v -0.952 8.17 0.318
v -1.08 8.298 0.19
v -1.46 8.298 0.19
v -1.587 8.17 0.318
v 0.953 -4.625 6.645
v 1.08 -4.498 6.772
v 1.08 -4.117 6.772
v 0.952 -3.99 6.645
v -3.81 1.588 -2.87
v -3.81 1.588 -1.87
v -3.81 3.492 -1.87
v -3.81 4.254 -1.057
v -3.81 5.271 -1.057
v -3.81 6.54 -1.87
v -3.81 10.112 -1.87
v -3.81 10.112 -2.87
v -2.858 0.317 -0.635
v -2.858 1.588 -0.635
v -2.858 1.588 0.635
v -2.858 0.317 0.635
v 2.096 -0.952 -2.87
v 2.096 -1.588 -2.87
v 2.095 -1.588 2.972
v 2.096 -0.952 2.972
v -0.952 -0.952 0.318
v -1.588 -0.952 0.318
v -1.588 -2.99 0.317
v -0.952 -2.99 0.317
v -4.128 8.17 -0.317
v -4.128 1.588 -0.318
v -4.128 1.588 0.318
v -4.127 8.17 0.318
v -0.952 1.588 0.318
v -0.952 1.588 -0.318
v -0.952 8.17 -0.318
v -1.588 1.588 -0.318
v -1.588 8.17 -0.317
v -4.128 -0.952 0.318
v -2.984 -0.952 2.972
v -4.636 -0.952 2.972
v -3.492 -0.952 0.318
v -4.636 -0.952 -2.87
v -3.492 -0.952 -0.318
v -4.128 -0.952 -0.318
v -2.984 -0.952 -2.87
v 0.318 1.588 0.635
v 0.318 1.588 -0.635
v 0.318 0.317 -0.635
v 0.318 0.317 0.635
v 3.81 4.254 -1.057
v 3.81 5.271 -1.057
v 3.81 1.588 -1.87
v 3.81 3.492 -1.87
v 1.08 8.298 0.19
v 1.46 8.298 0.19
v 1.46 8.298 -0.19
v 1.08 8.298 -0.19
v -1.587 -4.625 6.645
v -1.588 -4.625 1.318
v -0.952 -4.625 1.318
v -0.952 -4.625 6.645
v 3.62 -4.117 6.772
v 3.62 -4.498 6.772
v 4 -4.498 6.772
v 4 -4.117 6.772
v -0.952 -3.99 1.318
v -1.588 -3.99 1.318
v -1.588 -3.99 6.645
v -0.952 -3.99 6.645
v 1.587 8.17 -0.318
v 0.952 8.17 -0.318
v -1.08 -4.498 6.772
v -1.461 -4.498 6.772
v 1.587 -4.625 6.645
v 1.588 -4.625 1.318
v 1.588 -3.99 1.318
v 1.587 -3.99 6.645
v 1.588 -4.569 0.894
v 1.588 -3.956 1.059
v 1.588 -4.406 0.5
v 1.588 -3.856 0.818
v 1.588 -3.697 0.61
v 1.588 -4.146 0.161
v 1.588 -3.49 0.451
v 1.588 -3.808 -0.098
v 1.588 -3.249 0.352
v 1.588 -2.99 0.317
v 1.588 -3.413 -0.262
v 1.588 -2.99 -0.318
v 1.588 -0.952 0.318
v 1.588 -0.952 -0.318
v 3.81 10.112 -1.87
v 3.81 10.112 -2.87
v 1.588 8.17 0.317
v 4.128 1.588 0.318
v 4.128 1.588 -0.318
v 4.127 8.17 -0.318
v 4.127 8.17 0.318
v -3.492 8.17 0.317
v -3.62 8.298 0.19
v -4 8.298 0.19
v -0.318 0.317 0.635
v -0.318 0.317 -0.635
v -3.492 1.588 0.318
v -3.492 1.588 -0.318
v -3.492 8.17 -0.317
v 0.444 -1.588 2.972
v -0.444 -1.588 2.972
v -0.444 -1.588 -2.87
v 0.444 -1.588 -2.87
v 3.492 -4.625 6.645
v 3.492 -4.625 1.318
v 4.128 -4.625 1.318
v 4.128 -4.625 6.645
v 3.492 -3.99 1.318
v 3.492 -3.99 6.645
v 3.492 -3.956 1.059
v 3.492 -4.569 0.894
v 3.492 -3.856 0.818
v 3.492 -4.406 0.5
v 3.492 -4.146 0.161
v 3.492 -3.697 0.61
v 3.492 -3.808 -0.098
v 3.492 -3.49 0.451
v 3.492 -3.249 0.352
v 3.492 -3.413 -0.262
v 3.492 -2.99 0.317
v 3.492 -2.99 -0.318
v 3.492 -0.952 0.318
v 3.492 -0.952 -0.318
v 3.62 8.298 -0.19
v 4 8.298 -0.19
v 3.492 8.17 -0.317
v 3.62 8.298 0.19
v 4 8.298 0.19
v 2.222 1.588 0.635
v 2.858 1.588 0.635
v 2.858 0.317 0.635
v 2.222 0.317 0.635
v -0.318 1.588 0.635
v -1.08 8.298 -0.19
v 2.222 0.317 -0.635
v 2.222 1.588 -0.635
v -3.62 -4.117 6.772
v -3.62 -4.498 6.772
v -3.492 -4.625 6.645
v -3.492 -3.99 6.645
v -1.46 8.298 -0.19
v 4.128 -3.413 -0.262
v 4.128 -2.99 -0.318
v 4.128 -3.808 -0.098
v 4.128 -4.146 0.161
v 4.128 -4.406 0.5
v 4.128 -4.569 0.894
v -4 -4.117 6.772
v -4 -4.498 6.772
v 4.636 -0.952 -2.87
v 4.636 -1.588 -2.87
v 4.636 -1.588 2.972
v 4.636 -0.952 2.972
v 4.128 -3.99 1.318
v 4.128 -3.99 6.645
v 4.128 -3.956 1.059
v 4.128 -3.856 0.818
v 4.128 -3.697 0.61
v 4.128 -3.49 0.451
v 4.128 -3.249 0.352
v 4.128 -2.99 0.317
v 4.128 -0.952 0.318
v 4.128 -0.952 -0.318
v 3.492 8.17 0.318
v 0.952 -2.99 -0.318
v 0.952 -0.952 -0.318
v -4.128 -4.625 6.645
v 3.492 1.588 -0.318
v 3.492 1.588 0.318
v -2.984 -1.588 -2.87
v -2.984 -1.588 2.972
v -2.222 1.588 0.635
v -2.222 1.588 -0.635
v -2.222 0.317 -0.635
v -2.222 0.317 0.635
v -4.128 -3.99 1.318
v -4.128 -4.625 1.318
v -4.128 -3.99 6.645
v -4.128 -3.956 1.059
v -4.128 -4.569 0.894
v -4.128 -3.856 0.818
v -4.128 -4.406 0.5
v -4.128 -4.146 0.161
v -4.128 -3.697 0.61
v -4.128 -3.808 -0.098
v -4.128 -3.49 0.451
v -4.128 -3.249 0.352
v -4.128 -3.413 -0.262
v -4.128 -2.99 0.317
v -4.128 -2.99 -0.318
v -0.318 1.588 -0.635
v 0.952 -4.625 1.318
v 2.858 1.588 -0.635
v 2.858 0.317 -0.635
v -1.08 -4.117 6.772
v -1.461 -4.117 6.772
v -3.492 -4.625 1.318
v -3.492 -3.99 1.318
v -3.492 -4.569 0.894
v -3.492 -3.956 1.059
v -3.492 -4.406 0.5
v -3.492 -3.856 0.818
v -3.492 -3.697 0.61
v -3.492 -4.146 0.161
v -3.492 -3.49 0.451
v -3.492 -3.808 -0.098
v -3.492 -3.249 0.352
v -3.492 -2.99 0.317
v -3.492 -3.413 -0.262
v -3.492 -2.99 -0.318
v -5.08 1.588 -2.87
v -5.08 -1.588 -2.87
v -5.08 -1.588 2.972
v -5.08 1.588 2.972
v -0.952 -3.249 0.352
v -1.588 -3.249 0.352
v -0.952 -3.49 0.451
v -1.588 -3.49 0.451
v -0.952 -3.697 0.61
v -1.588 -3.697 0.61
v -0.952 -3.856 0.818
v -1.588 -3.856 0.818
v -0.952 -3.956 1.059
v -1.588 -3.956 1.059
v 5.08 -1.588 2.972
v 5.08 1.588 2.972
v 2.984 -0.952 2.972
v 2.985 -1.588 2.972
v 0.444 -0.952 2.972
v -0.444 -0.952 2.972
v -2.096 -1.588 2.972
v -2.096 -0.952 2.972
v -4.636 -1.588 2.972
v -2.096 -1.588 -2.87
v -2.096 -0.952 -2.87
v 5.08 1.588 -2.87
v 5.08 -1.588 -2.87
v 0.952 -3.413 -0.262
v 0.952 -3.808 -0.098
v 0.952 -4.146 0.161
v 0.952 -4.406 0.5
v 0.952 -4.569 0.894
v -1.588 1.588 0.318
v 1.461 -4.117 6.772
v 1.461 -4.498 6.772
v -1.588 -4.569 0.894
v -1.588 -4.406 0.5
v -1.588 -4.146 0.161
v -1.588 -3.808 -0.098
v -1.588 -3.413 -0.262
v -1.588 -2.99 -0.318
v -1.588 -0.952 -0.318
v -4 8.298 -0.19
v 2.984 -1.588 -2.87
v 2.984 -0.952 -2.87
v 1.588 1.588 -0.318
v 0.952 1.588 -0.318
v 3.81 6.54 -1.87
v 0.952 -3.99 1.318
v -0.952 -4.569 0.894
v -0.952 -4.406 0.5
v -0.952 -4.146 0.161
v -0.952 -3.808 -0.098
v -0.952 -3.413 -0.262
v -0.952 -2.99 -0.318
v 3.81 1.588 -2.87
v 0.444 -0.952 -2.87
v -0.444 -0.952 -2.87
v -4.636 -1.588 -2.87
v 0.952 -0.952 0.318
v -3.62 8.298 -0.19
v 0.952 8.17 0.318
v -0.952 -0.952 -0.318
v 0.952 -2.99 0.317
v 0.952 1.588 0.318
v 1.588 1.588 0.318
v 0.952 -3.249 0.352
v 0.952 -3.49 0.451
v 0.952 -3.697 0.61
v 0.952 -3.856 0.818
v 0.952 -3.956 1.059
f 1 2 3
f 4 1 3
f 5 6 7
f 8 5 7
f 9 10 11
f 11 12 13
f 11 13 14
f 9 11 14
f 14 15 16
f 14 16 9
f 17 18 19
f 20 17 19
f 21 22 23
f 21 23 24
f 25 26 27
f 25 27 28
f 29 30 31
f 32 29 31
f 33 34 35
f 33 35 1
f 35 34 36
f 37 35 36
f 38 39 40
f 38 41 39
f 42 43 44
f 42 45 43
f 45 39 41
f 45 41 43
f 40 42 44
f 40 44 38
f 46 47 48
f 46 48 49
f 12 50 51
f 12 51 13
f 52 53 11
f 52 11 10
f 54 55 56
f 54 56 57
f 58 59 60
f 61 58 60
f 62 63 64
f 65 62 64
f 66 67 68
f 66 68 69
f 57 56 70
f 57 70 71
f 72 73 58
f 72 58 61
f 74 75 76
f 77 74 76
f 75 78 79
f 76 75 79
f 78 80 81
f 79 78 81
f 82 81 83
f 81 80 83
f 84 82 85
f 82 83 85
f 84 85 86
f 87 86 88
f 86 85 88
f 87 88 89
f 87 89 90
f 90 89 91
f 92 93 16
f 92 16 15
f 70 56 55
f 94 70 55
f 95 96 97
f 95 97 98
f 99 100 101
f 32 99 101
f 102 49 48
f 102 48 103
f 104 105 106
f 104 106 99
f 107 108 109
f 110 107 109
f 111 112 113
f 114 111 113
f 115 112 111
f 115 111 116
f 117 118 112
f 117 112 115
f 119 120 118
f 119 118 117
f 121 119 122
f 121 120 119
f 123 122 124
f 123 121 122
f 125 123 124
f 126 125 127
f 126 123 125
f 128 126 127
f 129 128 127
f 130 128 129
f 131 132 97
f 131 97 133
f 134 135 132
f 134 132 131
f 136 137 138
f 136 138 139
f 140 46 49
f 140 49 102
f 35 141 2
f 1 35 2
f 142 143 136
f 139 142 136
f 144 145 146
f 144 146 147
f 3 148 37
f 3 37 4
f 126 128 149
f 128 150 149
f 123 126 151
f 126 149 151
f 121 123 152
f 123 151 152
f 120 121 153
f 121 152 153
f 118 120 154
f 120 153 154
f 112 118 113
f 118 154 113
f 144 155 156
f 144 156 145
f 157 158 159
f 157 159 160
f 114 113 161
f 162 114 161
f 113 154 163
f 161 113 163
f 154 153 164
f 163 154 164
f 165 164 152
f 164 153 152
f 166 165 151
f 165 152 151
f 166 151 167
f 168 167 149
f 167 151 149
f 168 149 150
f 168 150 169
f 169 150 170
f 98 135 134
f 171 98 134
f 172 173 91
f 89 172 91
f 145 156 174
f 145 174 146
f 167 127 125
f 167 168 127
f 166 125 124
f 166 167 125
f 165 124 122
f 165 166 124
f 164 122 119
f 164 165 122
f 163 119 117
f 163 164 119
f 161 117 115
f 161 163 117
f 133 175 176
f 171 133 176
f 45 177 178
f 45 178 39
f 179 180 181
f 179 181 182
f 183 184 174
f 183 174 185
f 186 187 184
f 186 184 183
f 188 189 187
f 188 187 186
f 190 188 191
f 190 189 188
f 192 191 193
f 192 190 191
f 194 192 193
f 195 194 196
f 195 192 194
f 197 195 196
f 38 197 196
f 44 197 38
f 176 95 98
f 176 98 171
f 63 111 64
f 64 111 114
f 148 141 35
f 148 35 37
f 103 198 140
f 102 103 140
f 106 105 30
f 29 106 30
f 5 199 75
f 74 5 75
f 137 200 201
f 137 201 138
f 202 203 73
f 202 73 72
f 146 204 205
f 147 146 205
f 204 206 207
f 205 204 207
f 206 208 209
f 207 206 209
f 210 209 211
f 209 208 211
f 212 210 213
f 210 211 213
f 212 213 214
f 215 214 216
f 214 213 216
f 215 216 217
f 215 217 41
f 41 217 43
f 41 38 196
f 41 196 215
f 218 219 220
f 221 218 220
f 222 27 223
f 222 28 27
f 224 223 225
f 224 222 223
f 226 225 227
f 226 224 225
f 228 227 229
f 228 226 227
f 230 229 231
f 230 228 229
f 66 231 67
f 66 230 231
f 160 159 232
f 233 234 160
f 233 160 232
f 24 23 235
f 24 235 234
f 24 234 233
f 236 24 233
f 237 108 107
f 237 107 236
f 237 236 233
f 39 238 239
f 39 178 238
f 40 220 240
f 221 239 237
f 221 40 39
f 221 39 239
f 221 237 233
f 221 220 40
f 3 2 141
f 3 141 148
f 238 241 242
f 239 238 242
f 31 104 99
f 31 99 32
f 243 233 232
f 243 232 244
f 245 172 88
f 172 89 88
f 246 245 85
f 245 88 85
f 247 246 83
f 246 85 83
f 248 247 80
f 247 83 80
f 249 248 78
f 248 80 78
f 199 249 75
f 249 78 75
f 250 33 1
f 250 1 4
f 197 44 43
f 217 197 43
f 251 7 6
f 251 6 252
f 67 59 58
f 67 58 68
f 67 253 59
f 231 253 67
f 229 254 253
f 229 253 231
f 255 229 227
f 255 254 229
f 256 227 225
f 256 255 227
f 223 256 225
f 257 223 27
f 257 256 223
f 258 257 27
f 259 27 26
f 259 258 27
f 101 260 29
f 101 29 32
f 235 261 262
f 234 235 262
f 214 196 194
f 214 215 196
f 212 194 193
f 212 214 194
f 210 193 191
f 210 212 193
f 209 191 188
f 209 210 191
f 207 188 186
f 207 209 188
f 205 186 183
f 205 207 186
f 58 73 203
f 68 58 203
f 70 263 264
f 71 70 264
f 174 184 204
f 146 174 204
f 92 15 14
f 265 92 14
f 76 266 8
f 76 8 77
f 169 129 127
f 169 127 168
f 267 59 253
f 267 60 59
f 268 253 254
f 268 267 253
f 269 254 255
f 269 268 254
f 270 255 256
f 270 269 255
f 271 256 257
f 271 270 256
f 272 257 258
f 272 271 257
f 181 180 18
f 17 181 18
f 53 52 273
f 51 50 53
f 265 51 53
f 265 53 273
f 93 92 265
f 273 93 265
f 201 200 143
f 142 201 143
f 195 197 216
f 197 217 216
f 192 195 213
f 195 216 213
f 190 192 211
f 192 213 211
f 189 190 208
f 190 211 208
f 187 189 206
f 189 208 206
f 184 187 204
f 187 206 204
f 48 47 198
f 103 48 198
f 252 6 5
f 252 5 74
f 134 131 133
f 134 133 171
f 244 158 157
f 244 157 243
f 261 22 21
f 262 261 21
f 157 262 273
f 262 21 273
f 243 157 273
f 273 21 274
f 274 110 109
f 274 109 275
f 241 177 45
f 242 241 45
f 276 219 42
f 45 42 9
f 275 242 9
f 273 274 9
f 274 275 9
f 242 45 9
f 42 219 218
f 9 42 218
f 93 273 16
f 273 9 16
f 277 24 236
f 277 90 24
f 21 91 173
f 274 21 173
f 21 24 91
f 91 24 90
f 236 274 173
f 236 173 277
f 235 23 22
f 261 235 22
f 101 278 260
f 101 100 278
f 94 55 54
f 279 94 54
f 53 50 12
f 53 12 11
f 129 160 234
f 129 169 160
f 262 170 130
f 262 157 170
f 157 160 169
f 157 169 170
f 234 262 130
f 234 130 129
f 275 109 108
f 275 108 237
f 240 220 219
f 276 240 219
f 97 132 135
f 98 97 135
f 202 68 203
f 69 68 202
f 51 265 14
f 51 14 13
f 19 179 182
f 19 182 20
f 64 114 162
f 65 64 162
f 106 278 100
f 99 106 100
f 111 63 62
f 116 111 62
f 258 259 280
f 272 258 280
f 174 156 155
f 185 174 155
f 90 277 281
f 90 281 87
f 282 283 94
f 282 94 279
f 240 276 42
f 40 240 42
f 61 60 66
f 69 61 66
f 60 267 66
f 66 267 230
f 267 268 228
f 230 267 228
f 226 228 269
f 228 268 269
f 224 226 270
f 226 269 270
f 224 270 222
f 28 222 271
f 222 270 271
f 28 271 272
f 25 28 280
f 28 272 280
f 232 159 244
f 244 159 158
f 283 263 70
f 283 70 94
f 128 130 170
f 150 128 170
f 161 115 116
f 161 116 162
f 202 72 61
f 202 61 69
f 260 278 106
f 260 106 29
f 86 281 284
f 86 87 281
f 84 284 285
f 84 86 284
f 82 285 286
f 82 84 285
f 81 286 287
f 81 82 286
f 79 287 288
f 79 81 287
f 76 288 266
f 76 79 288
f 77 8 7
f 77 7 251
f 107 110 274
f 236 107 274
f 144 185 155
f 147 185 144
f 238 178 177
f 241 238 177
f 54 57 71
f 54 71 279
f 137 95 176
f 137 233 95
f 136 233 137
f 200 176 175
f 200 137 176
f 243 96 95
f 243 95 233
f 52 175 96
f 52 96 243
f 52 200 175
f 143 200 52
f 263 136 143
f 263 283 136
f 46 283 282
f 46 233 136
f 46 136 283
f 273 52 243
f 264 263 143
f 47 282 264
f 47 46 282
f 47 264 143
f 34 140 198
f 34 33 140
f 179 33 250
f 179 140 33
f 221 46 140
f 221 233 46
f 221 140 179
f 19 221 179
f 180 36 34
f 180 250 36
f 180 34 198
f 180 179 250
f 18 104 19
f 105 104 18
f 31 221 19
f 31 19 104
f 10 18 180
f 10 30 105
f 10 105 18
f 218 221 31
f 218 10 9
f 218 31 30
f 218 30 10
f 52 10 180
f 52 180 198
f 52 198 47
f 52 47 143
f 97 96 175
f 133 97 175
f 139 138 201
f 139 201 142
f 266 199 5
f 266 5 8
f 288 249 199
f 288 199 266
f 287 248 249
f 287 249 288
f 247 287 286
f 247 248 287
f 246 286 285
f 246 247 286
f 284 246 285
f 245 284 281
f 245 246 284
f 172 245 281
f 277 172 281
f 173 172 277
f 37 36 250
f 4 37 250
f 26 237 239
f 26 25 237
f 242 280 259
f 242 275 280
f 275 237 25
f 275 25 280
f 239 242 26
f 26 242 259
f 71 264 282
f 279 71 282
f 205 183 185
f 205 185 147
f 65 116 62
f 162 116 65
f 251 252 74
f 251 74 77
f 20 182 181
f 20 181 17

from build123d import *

# Parameters (mm, degrees)
SKETCH1_W            = 8.89
SKETCH1_H            = 5.842
BOSS_EXTRUDE1_DEPTH  = 3.175
BOSS_EXTRUDE2_DEPTH  = 7.62
SKETCH3_W            = 5.842
SKETCH3_H            = 3.175
BOSS_EXTRUDE3_DEPTH  = 1.27
SKETCH4_W            = 1.651
SKETCH4_H            = 0.635
CUT_EXTRUDE1_DEPTH   = 13.735698656
SKETCH5_W            = 0.635
SKETCH5_H            = 0.635
BOSS_EXTRUDE4_DEPTH  = 3.6725
SKETCH6_W            = 0.635
SKETCH6_H            = 0.635
BOSS_EXTRUDE5_DEPTH  = 6.4543
SKETCH7_W            = 1.651
SKETCH7_H            = 0.635
CUT_EXTRUDE2_DEPTH   = 15.867320547
SKETCH8_W            = 0.635
SKETCH8_H            = 0.635
BOSS_EXTRUDE6_DEPTH  = 3.6725
SKETCH9_W            = 0.635
SKETCH9_H            = 0.635
BOSS_EXTRUDE7_DEPTH  = 6.4543
SKETCH10_W           = 1.651
SKETCH10_H           = 0.635
CUT_EXTRUDE3_DEPTH   = 15.867320547
SKETCH11_W           = 0.635
SKETCH11_H           = 0.635
BOSS_EXTRUDE8_DEPTH  = 3.6725
SKETCH12_W           = 0.635
SKETCH12_H           = 0.635
BOSS_EXTRUDE9_DEPTH  = 6.4543
SKETCH13_W           = 1.651
SKETCH13_H           = 0.635
CUT_EXTRUDE4_DEPTH   = 15.867320547
SKETCH14_W           = 0.635
SKETCH14_H           = 0.635
BOSS_EXTRUDE10_DEPTH = 3.6725
SKETCH15_W           = 0.635
SKETCH15_H           = 0.635
BOSS_EXTRUDE11_DEPTH = 6.4543
SKETCH16_W           = 0.635
SKETCH16_H           = 0.635
BOSS_EXTRUDE12_DEPTH = 6.71
SKETCH17_W           = 0.635
SKETCH17_H           = 0.635
BOSS_EXTRUDE13_DEPTH = 6.71
SKETCH18_W           = 0.635
SKETCH18_H           = 0.635
BOSS_EXTRUDE14_DEPTH = 6.71
SKETCH19_W           = 0.635
SKETCH19_H           = 0.635
BOSS_EXTRUDE15_DEPTH = 6.71
SKETCH20_W           = 0.635
SKETCH20_H           = 1.27
CUT_EXTRUDE5_DEPTH   = 1.27
SKETCH21_W           = 0.635
SKETCH21_H           = 1.27
CUT_EXTRUDE6_DEPTH   = 1.27
SKETCH22_W           = 0.635
SKETCH22_H           = 1.27
CUT_EXTRUDE7_DEPTH   = 1.27
CHAMFER1_SIZE        = 0.127
CHAMFER2_SIZE        = 0.753913762
CHAMFER2_SIZE2       = 0.55706549
FILLET1_R            = 1
FILLET2_R            = 1.635


with BuildPart() as part:
    # Sketch1 → Boss-Extrude1 (new body)
    with BuildSketch(Plane.XZ.offset(1.5875)):
        with Locations((-0.635, 0.0508)):
            Rectangle(SKETCH1_W, SKETCH1_H)
    extrude(amount=-BOSS_EXTRUDE1_DEPTH)

    # Sketch2 → Boss-Extrude2 (add)
    with BuildSketch(Plane(origin=(3.81, 0, 0), x_dir=(0, 0, -1), z_dir=(1, 0, 0))):
        Polygon((0.651, 4.6355), (1.8702, 3.4925), (1.8702, 1.5875), (2.8702, 1.5875), (2.8702, 10.1125), (1.8702, 10.1125), (1.8702, 6.5405), align=None)
    extrude(amount=-BOSS_EXTRUDE2_DEPTH)

    # Sketch3 → Boss-Extrude3 (add)
    with BuildSketch(Plane(origin=(3.81, 0, 0), x_dir=(0, 0, -1), z_dir=(1, 0, 0))):
        with Locations((-0.0508, 0)):
            Rectangle(SKETCH3_W, SKETCH3_H)
    extrude(amount=BOSS_EXTRUDE3_DEPTH)

    # Sketch4 → Cut-Extrude1 (cut, through all)
    with BuildSketch(Plane(origin=(0, 0, -2.8702), x_dir=(-1, 0, 0), z_dir=(0, 0, -1))):
        with Locations((1.27, -1.27)):
            Rectangle(SKETCH4_W, SKETCH4_H)
    extrude(amount=-CUT_EXTRUDE1_DEPTH, mode=Mode.SUBTRACT)

    # Sketch5 → Boss-Extrude4 (add)
    with BuildSketch(Plane.XZ.offset(0.9525)):
        with Locations((-1.27, 0)):
            Rectangle(SKETCH5_W, SKETCH5_H)
    extrude(amount=BOSS_EXTRUDE4_DEPTH)

    # Sketch6 → Boss-Extrude5 (add)
    with BuildSketch(Plane.XY.offset(0.3175)):
        with Locations((-1.27, -4.3075)):
            Rectangle(SKETCH6_W, SKETCH6_H)
    extrude(amount=BOSS_EXTRUDE5_DEPTH)

    # Sketch7 → Cut-Extrude2 (cut, through all)
    with BuildSketch(Plane(origin=(0, 0, -2.8702), x_dir=(-1, 0, 0), z_dir=(0, 0, -1))):
        with Locations((-1.27, -1.27)):
            Rectangle(SKETCH7_W, SKETCH7_H)
    extrude(amount=-CUT_EXTRUDE2_DEPTH, mode=Mode.SUBTRACT)

    # Sketch8 → Boss-Extrude6 (add)
    with BuildSketch(Plane.XZ.offset(0.9525)):
        with Locations((1.27, 0)):
            Rectangle(SKETCH8_W, SKETCH8_H)
    extrude(amount=BOSS_EXTRUDE6_DEPTH)

    # Sketch9 → Boss-Extrude7 (add)
    with BuildSketch(Plane.XY.offset(0.3175)):
        with Locations((1.27, -4.3075)):
            Rectangle(SKETCH9_W, SKETCH9_H)
    extrude(amount=BOSS_EXTRUDE7_DEPTH)

    # Sketch10 → Cut-Extrude3 (cut, through all)
    with BuildSketch(Plane(origin=(0, 0, -2.8702), x_dir=(-1, 0, 0), z_dir=(0, 0, -1))):
        with Locations((3.81, -1.27)):
            Rectangle(SKETCH10_W, SKETCH10_H)
    extrude(amount=-CUT_EXTRUDE3_DEPTH, mode=Mode.SUBTRACT)

    # Sketch11 → Boss-Extrude8 (add)
    with BuildSketch(Plane.XZ.offset(0.9525)):
        with Locations((-3.81, 0)):
            Rectangle(SKETCH11_W, SKETCH11_H)
    extrude(amount=BOSS_EXTRUDE8_DEPTH)

    # Sketch12 → Boss-Extrude9 (add)
    with BuildSketch(Plane.XY.offset(0.3175)):
        with Locations((-3.81, -4.3075)):
            Rectangle(SKETCH12_W, SKETCH12_H)
    extrude(amount=BOSS_EXTRUDE9_DEPTH)

    # Sketch13 → Cut-Extrude4 (cut, through all)
    with BuildSketch(Plane(origin=(0, 0, -2.8702), x_dir=(-1, 0, 0), z_dir=(0, 0, -1))):
        with Locations((-3.81, -1.27)):
            Rectangle(SKETCH13_W, SKETCH13_H)
    extrude(amount=-CUT_EXTRUDE4_DEPTH, mode=Mode.SUBTRACT)

    # Sketch14 → Boss-Extrude10 (add)
    with BuildSketch(Plane.XZ.offset(0.9525)):
        with Locations((3.81, 0)):
            Rectangle(SKETCH14_W, SKETCH14_H)
    extrude(amount=BOSS_EXTRUDE10_DEPTH)

    # Sketch15 → Boss-Extrude11 (add)
    with BuildSketch(Plane.XY.offset(0.3175)):
        with Locations((3.81, -4.3075)):
            Rectangle(SKETCH15_W, SKETCH15_H)
    extrude(amount=BOSS_EXTRUDE11_DEPTH)

    # Sketch16 → Boss-Extrude12 (add)
    with BuildSketch(Plane(origin=(0, 1.5875, 0), x_dir=(-1, 0, 0), z_dir=(0, 1, 0))):
        with Locations((-3.81, 0)):
            Rectangle(SKETCH16_W, SKETCH16_H)
    extrude(amount=BOSS_EXTRUDE12_DEPTH)

    # Sketch17 → Boss-Extrude13 (add)
    with BuildSketch(Plane(origin=(0, 1.5875, 0), x_dir=(-1, 0, 0), z_dir=(0, 1, 0))):
        with Locations((-1.27, 0)):
            Rectangle(SKETCH17_W, SKETCH17_H)
    extrude(amount=BOSS_EXTRUDE13_DEPTH)

    # Sketch18 → Boss-Extrude14 (add)
    with BuildSketch(Plane(origin=(0, 1.5875, 0), x_dir=(-1, 0, 0), z_dir=(0, 1, 0))):
        with Locations((1.27, 0)):
            Rectangle(SKETCH18_W, SKETCH18_H)
    extrude(amount=BOSS_EXTRUDE14_DEPTH)

    # Sketch19 → Boss-Extrude15 (add)
    with BuildSketch(Plane(origin=(0, 1.5875, 0), x_dir=(-1, 0, 0), z_dir=(0, 1, 0))):
        with Locations((3.81, 0)):
            Rectangle(SKETCH19_W, SKETCH19_H)
    extrude(amount=BOSS_EXTRUDE15_DEPTH)

    # Sketch20 → Cut-Extrude5 (cut)
    with BuildSketch(Plane(origin=(0, 1.5875, 0), x_dir=(-1, 0, 0), z_dir=(0, 1, 0))):
        with Locations((-2.54, 0)):
            Rectangle(SKETCH20_W, SKETCH20_H)
    extrude(amount=-CUT_EXTRUDE5_DEPTH, mode=Mode.SUBTRACT)

    # Sketch21 → Cut-Extrude6 (cut)
    with BuildSketch(Plane(origin=(0, 1.5875, 0), x_dir=(-1, 0, 0), z_dir=(0, 1, 0))):
        Rectangle(SKETCH21_W, SKETCH21_H)
    extrude(amount=-CUT_EXTRUDE6_DEPTH, mode=Mode.SUBTRACT)

    # Sketch22 → Cut-Extrude7 (cut)
    with BuildSketch(Plane(origin=(0, 1.5875, 0), x_dir=(-1, 0, 0), z_dir=(0, 1, 0))):
        with Locations((2.54, 0)):
            Rectangle(SKETCH22_W, SKETCH22_H)
    extrude(amount=-CUT_EXTRUDE7_DEPTH, mode=Mode.SUBTRACT)

    # Chamfer1
    chamfer1_edges = [part.edges().sort_by_distance(p)[0] for p in [
        (1.5875, -4.3075, 6.7718),
        (1.27, -3.99, 6.7718),
        (0.9525, -4.3075, 6.7718),
        (1.27, -4.625, 6.7718),
        (-3.4925, -4.3075, 6.7718),
        (-3.81, -3.99, 6.7718),
        (-4.1275, -4.3075, 6.7718),
        (-3.81, -4.625, 6.7718),
        (4.1275, -4.3075, 6.7718),
        (3.81, -3.99, 6.7718),
        (3.4925, -4.3075, 6.7718),
        (3.81, -4.625, 6.7718),
        (4.1275, 8.2975, 0),
        (3.81, 8.2975, -0.3175),
        (3.4925, 8.2975, 0),
        (3.81, 8.2975, 0.3175),
        (0.9525, 8.2975, 0),
        (1.27, 8.2975, 0.3175),
        (1.5875, 8.2975, 0),
        (1.27, 8.2975, -0.3175),
        (-0.9525, 8.2975, 0),
        (-1.27, 8.2975, -0.3175),
        (-1.5875, 8.2975, 0),
        (-1.27, 8.2975, 0.3175),
        (-3.81, 8.2975, -0.3175),
        (-4.1275, 8.2975, 0),
        (-3.81, 8.2975, 0.3175),
        (-3.4925, 8.2975, 0),
        (-1.27, -3.99, 6.7718),
        (-1.5875, -4.3075, 6.7718),
        (-1.27, -4.625, 6.7718),
        (-0.9525, -4.3075, 6.7718),
    ]]
    chamfer(chamfer1_edges, length=CHAMFER1_SIZE)

    # Chamfer2
    chamfer2_edges = [part.edges().sort_by_distance(p)[0] for p in [
        (0, 4.6355, -0.651),
    ]]
    chamfer2_side = [part.faces().sort_by_distance(p)[0] for p in [
        (0, 5.588, -1.2606),
    ]]
    chamfer(chamfer2_edges, length=CHAMFER2_SIZE, length2=CHAMFER2_SIZE2, reference=chamfer2_side[0])

    # Fillet1
    fillet1_edges = [part.edges().sort_by_distance(p)[0] for p in [
        (1.27, -3.99, 0.3175),
        (-3.81, -3.99, 0.3175),
        (3.81, -3.99, 0.3175),
        (-1.27, -3.99, 0.3175),
    ]]
    fillet(fillet1_edges, radius=FILLET1_R)

    # Fillet2
    fillet2_edges = [part.edges().sort_by_distance(p)[0] for p in [
        (1.27, -4.625, -0.3175),
        (-3.81, -4.625, -0.3175),
        (3.81, -4.625, -0.3175),
        (-1.27, -4.625, -0.3175),
    ]]
    fillet(fillet2_edges, radius=FILLET2_R)


solid = part.part
